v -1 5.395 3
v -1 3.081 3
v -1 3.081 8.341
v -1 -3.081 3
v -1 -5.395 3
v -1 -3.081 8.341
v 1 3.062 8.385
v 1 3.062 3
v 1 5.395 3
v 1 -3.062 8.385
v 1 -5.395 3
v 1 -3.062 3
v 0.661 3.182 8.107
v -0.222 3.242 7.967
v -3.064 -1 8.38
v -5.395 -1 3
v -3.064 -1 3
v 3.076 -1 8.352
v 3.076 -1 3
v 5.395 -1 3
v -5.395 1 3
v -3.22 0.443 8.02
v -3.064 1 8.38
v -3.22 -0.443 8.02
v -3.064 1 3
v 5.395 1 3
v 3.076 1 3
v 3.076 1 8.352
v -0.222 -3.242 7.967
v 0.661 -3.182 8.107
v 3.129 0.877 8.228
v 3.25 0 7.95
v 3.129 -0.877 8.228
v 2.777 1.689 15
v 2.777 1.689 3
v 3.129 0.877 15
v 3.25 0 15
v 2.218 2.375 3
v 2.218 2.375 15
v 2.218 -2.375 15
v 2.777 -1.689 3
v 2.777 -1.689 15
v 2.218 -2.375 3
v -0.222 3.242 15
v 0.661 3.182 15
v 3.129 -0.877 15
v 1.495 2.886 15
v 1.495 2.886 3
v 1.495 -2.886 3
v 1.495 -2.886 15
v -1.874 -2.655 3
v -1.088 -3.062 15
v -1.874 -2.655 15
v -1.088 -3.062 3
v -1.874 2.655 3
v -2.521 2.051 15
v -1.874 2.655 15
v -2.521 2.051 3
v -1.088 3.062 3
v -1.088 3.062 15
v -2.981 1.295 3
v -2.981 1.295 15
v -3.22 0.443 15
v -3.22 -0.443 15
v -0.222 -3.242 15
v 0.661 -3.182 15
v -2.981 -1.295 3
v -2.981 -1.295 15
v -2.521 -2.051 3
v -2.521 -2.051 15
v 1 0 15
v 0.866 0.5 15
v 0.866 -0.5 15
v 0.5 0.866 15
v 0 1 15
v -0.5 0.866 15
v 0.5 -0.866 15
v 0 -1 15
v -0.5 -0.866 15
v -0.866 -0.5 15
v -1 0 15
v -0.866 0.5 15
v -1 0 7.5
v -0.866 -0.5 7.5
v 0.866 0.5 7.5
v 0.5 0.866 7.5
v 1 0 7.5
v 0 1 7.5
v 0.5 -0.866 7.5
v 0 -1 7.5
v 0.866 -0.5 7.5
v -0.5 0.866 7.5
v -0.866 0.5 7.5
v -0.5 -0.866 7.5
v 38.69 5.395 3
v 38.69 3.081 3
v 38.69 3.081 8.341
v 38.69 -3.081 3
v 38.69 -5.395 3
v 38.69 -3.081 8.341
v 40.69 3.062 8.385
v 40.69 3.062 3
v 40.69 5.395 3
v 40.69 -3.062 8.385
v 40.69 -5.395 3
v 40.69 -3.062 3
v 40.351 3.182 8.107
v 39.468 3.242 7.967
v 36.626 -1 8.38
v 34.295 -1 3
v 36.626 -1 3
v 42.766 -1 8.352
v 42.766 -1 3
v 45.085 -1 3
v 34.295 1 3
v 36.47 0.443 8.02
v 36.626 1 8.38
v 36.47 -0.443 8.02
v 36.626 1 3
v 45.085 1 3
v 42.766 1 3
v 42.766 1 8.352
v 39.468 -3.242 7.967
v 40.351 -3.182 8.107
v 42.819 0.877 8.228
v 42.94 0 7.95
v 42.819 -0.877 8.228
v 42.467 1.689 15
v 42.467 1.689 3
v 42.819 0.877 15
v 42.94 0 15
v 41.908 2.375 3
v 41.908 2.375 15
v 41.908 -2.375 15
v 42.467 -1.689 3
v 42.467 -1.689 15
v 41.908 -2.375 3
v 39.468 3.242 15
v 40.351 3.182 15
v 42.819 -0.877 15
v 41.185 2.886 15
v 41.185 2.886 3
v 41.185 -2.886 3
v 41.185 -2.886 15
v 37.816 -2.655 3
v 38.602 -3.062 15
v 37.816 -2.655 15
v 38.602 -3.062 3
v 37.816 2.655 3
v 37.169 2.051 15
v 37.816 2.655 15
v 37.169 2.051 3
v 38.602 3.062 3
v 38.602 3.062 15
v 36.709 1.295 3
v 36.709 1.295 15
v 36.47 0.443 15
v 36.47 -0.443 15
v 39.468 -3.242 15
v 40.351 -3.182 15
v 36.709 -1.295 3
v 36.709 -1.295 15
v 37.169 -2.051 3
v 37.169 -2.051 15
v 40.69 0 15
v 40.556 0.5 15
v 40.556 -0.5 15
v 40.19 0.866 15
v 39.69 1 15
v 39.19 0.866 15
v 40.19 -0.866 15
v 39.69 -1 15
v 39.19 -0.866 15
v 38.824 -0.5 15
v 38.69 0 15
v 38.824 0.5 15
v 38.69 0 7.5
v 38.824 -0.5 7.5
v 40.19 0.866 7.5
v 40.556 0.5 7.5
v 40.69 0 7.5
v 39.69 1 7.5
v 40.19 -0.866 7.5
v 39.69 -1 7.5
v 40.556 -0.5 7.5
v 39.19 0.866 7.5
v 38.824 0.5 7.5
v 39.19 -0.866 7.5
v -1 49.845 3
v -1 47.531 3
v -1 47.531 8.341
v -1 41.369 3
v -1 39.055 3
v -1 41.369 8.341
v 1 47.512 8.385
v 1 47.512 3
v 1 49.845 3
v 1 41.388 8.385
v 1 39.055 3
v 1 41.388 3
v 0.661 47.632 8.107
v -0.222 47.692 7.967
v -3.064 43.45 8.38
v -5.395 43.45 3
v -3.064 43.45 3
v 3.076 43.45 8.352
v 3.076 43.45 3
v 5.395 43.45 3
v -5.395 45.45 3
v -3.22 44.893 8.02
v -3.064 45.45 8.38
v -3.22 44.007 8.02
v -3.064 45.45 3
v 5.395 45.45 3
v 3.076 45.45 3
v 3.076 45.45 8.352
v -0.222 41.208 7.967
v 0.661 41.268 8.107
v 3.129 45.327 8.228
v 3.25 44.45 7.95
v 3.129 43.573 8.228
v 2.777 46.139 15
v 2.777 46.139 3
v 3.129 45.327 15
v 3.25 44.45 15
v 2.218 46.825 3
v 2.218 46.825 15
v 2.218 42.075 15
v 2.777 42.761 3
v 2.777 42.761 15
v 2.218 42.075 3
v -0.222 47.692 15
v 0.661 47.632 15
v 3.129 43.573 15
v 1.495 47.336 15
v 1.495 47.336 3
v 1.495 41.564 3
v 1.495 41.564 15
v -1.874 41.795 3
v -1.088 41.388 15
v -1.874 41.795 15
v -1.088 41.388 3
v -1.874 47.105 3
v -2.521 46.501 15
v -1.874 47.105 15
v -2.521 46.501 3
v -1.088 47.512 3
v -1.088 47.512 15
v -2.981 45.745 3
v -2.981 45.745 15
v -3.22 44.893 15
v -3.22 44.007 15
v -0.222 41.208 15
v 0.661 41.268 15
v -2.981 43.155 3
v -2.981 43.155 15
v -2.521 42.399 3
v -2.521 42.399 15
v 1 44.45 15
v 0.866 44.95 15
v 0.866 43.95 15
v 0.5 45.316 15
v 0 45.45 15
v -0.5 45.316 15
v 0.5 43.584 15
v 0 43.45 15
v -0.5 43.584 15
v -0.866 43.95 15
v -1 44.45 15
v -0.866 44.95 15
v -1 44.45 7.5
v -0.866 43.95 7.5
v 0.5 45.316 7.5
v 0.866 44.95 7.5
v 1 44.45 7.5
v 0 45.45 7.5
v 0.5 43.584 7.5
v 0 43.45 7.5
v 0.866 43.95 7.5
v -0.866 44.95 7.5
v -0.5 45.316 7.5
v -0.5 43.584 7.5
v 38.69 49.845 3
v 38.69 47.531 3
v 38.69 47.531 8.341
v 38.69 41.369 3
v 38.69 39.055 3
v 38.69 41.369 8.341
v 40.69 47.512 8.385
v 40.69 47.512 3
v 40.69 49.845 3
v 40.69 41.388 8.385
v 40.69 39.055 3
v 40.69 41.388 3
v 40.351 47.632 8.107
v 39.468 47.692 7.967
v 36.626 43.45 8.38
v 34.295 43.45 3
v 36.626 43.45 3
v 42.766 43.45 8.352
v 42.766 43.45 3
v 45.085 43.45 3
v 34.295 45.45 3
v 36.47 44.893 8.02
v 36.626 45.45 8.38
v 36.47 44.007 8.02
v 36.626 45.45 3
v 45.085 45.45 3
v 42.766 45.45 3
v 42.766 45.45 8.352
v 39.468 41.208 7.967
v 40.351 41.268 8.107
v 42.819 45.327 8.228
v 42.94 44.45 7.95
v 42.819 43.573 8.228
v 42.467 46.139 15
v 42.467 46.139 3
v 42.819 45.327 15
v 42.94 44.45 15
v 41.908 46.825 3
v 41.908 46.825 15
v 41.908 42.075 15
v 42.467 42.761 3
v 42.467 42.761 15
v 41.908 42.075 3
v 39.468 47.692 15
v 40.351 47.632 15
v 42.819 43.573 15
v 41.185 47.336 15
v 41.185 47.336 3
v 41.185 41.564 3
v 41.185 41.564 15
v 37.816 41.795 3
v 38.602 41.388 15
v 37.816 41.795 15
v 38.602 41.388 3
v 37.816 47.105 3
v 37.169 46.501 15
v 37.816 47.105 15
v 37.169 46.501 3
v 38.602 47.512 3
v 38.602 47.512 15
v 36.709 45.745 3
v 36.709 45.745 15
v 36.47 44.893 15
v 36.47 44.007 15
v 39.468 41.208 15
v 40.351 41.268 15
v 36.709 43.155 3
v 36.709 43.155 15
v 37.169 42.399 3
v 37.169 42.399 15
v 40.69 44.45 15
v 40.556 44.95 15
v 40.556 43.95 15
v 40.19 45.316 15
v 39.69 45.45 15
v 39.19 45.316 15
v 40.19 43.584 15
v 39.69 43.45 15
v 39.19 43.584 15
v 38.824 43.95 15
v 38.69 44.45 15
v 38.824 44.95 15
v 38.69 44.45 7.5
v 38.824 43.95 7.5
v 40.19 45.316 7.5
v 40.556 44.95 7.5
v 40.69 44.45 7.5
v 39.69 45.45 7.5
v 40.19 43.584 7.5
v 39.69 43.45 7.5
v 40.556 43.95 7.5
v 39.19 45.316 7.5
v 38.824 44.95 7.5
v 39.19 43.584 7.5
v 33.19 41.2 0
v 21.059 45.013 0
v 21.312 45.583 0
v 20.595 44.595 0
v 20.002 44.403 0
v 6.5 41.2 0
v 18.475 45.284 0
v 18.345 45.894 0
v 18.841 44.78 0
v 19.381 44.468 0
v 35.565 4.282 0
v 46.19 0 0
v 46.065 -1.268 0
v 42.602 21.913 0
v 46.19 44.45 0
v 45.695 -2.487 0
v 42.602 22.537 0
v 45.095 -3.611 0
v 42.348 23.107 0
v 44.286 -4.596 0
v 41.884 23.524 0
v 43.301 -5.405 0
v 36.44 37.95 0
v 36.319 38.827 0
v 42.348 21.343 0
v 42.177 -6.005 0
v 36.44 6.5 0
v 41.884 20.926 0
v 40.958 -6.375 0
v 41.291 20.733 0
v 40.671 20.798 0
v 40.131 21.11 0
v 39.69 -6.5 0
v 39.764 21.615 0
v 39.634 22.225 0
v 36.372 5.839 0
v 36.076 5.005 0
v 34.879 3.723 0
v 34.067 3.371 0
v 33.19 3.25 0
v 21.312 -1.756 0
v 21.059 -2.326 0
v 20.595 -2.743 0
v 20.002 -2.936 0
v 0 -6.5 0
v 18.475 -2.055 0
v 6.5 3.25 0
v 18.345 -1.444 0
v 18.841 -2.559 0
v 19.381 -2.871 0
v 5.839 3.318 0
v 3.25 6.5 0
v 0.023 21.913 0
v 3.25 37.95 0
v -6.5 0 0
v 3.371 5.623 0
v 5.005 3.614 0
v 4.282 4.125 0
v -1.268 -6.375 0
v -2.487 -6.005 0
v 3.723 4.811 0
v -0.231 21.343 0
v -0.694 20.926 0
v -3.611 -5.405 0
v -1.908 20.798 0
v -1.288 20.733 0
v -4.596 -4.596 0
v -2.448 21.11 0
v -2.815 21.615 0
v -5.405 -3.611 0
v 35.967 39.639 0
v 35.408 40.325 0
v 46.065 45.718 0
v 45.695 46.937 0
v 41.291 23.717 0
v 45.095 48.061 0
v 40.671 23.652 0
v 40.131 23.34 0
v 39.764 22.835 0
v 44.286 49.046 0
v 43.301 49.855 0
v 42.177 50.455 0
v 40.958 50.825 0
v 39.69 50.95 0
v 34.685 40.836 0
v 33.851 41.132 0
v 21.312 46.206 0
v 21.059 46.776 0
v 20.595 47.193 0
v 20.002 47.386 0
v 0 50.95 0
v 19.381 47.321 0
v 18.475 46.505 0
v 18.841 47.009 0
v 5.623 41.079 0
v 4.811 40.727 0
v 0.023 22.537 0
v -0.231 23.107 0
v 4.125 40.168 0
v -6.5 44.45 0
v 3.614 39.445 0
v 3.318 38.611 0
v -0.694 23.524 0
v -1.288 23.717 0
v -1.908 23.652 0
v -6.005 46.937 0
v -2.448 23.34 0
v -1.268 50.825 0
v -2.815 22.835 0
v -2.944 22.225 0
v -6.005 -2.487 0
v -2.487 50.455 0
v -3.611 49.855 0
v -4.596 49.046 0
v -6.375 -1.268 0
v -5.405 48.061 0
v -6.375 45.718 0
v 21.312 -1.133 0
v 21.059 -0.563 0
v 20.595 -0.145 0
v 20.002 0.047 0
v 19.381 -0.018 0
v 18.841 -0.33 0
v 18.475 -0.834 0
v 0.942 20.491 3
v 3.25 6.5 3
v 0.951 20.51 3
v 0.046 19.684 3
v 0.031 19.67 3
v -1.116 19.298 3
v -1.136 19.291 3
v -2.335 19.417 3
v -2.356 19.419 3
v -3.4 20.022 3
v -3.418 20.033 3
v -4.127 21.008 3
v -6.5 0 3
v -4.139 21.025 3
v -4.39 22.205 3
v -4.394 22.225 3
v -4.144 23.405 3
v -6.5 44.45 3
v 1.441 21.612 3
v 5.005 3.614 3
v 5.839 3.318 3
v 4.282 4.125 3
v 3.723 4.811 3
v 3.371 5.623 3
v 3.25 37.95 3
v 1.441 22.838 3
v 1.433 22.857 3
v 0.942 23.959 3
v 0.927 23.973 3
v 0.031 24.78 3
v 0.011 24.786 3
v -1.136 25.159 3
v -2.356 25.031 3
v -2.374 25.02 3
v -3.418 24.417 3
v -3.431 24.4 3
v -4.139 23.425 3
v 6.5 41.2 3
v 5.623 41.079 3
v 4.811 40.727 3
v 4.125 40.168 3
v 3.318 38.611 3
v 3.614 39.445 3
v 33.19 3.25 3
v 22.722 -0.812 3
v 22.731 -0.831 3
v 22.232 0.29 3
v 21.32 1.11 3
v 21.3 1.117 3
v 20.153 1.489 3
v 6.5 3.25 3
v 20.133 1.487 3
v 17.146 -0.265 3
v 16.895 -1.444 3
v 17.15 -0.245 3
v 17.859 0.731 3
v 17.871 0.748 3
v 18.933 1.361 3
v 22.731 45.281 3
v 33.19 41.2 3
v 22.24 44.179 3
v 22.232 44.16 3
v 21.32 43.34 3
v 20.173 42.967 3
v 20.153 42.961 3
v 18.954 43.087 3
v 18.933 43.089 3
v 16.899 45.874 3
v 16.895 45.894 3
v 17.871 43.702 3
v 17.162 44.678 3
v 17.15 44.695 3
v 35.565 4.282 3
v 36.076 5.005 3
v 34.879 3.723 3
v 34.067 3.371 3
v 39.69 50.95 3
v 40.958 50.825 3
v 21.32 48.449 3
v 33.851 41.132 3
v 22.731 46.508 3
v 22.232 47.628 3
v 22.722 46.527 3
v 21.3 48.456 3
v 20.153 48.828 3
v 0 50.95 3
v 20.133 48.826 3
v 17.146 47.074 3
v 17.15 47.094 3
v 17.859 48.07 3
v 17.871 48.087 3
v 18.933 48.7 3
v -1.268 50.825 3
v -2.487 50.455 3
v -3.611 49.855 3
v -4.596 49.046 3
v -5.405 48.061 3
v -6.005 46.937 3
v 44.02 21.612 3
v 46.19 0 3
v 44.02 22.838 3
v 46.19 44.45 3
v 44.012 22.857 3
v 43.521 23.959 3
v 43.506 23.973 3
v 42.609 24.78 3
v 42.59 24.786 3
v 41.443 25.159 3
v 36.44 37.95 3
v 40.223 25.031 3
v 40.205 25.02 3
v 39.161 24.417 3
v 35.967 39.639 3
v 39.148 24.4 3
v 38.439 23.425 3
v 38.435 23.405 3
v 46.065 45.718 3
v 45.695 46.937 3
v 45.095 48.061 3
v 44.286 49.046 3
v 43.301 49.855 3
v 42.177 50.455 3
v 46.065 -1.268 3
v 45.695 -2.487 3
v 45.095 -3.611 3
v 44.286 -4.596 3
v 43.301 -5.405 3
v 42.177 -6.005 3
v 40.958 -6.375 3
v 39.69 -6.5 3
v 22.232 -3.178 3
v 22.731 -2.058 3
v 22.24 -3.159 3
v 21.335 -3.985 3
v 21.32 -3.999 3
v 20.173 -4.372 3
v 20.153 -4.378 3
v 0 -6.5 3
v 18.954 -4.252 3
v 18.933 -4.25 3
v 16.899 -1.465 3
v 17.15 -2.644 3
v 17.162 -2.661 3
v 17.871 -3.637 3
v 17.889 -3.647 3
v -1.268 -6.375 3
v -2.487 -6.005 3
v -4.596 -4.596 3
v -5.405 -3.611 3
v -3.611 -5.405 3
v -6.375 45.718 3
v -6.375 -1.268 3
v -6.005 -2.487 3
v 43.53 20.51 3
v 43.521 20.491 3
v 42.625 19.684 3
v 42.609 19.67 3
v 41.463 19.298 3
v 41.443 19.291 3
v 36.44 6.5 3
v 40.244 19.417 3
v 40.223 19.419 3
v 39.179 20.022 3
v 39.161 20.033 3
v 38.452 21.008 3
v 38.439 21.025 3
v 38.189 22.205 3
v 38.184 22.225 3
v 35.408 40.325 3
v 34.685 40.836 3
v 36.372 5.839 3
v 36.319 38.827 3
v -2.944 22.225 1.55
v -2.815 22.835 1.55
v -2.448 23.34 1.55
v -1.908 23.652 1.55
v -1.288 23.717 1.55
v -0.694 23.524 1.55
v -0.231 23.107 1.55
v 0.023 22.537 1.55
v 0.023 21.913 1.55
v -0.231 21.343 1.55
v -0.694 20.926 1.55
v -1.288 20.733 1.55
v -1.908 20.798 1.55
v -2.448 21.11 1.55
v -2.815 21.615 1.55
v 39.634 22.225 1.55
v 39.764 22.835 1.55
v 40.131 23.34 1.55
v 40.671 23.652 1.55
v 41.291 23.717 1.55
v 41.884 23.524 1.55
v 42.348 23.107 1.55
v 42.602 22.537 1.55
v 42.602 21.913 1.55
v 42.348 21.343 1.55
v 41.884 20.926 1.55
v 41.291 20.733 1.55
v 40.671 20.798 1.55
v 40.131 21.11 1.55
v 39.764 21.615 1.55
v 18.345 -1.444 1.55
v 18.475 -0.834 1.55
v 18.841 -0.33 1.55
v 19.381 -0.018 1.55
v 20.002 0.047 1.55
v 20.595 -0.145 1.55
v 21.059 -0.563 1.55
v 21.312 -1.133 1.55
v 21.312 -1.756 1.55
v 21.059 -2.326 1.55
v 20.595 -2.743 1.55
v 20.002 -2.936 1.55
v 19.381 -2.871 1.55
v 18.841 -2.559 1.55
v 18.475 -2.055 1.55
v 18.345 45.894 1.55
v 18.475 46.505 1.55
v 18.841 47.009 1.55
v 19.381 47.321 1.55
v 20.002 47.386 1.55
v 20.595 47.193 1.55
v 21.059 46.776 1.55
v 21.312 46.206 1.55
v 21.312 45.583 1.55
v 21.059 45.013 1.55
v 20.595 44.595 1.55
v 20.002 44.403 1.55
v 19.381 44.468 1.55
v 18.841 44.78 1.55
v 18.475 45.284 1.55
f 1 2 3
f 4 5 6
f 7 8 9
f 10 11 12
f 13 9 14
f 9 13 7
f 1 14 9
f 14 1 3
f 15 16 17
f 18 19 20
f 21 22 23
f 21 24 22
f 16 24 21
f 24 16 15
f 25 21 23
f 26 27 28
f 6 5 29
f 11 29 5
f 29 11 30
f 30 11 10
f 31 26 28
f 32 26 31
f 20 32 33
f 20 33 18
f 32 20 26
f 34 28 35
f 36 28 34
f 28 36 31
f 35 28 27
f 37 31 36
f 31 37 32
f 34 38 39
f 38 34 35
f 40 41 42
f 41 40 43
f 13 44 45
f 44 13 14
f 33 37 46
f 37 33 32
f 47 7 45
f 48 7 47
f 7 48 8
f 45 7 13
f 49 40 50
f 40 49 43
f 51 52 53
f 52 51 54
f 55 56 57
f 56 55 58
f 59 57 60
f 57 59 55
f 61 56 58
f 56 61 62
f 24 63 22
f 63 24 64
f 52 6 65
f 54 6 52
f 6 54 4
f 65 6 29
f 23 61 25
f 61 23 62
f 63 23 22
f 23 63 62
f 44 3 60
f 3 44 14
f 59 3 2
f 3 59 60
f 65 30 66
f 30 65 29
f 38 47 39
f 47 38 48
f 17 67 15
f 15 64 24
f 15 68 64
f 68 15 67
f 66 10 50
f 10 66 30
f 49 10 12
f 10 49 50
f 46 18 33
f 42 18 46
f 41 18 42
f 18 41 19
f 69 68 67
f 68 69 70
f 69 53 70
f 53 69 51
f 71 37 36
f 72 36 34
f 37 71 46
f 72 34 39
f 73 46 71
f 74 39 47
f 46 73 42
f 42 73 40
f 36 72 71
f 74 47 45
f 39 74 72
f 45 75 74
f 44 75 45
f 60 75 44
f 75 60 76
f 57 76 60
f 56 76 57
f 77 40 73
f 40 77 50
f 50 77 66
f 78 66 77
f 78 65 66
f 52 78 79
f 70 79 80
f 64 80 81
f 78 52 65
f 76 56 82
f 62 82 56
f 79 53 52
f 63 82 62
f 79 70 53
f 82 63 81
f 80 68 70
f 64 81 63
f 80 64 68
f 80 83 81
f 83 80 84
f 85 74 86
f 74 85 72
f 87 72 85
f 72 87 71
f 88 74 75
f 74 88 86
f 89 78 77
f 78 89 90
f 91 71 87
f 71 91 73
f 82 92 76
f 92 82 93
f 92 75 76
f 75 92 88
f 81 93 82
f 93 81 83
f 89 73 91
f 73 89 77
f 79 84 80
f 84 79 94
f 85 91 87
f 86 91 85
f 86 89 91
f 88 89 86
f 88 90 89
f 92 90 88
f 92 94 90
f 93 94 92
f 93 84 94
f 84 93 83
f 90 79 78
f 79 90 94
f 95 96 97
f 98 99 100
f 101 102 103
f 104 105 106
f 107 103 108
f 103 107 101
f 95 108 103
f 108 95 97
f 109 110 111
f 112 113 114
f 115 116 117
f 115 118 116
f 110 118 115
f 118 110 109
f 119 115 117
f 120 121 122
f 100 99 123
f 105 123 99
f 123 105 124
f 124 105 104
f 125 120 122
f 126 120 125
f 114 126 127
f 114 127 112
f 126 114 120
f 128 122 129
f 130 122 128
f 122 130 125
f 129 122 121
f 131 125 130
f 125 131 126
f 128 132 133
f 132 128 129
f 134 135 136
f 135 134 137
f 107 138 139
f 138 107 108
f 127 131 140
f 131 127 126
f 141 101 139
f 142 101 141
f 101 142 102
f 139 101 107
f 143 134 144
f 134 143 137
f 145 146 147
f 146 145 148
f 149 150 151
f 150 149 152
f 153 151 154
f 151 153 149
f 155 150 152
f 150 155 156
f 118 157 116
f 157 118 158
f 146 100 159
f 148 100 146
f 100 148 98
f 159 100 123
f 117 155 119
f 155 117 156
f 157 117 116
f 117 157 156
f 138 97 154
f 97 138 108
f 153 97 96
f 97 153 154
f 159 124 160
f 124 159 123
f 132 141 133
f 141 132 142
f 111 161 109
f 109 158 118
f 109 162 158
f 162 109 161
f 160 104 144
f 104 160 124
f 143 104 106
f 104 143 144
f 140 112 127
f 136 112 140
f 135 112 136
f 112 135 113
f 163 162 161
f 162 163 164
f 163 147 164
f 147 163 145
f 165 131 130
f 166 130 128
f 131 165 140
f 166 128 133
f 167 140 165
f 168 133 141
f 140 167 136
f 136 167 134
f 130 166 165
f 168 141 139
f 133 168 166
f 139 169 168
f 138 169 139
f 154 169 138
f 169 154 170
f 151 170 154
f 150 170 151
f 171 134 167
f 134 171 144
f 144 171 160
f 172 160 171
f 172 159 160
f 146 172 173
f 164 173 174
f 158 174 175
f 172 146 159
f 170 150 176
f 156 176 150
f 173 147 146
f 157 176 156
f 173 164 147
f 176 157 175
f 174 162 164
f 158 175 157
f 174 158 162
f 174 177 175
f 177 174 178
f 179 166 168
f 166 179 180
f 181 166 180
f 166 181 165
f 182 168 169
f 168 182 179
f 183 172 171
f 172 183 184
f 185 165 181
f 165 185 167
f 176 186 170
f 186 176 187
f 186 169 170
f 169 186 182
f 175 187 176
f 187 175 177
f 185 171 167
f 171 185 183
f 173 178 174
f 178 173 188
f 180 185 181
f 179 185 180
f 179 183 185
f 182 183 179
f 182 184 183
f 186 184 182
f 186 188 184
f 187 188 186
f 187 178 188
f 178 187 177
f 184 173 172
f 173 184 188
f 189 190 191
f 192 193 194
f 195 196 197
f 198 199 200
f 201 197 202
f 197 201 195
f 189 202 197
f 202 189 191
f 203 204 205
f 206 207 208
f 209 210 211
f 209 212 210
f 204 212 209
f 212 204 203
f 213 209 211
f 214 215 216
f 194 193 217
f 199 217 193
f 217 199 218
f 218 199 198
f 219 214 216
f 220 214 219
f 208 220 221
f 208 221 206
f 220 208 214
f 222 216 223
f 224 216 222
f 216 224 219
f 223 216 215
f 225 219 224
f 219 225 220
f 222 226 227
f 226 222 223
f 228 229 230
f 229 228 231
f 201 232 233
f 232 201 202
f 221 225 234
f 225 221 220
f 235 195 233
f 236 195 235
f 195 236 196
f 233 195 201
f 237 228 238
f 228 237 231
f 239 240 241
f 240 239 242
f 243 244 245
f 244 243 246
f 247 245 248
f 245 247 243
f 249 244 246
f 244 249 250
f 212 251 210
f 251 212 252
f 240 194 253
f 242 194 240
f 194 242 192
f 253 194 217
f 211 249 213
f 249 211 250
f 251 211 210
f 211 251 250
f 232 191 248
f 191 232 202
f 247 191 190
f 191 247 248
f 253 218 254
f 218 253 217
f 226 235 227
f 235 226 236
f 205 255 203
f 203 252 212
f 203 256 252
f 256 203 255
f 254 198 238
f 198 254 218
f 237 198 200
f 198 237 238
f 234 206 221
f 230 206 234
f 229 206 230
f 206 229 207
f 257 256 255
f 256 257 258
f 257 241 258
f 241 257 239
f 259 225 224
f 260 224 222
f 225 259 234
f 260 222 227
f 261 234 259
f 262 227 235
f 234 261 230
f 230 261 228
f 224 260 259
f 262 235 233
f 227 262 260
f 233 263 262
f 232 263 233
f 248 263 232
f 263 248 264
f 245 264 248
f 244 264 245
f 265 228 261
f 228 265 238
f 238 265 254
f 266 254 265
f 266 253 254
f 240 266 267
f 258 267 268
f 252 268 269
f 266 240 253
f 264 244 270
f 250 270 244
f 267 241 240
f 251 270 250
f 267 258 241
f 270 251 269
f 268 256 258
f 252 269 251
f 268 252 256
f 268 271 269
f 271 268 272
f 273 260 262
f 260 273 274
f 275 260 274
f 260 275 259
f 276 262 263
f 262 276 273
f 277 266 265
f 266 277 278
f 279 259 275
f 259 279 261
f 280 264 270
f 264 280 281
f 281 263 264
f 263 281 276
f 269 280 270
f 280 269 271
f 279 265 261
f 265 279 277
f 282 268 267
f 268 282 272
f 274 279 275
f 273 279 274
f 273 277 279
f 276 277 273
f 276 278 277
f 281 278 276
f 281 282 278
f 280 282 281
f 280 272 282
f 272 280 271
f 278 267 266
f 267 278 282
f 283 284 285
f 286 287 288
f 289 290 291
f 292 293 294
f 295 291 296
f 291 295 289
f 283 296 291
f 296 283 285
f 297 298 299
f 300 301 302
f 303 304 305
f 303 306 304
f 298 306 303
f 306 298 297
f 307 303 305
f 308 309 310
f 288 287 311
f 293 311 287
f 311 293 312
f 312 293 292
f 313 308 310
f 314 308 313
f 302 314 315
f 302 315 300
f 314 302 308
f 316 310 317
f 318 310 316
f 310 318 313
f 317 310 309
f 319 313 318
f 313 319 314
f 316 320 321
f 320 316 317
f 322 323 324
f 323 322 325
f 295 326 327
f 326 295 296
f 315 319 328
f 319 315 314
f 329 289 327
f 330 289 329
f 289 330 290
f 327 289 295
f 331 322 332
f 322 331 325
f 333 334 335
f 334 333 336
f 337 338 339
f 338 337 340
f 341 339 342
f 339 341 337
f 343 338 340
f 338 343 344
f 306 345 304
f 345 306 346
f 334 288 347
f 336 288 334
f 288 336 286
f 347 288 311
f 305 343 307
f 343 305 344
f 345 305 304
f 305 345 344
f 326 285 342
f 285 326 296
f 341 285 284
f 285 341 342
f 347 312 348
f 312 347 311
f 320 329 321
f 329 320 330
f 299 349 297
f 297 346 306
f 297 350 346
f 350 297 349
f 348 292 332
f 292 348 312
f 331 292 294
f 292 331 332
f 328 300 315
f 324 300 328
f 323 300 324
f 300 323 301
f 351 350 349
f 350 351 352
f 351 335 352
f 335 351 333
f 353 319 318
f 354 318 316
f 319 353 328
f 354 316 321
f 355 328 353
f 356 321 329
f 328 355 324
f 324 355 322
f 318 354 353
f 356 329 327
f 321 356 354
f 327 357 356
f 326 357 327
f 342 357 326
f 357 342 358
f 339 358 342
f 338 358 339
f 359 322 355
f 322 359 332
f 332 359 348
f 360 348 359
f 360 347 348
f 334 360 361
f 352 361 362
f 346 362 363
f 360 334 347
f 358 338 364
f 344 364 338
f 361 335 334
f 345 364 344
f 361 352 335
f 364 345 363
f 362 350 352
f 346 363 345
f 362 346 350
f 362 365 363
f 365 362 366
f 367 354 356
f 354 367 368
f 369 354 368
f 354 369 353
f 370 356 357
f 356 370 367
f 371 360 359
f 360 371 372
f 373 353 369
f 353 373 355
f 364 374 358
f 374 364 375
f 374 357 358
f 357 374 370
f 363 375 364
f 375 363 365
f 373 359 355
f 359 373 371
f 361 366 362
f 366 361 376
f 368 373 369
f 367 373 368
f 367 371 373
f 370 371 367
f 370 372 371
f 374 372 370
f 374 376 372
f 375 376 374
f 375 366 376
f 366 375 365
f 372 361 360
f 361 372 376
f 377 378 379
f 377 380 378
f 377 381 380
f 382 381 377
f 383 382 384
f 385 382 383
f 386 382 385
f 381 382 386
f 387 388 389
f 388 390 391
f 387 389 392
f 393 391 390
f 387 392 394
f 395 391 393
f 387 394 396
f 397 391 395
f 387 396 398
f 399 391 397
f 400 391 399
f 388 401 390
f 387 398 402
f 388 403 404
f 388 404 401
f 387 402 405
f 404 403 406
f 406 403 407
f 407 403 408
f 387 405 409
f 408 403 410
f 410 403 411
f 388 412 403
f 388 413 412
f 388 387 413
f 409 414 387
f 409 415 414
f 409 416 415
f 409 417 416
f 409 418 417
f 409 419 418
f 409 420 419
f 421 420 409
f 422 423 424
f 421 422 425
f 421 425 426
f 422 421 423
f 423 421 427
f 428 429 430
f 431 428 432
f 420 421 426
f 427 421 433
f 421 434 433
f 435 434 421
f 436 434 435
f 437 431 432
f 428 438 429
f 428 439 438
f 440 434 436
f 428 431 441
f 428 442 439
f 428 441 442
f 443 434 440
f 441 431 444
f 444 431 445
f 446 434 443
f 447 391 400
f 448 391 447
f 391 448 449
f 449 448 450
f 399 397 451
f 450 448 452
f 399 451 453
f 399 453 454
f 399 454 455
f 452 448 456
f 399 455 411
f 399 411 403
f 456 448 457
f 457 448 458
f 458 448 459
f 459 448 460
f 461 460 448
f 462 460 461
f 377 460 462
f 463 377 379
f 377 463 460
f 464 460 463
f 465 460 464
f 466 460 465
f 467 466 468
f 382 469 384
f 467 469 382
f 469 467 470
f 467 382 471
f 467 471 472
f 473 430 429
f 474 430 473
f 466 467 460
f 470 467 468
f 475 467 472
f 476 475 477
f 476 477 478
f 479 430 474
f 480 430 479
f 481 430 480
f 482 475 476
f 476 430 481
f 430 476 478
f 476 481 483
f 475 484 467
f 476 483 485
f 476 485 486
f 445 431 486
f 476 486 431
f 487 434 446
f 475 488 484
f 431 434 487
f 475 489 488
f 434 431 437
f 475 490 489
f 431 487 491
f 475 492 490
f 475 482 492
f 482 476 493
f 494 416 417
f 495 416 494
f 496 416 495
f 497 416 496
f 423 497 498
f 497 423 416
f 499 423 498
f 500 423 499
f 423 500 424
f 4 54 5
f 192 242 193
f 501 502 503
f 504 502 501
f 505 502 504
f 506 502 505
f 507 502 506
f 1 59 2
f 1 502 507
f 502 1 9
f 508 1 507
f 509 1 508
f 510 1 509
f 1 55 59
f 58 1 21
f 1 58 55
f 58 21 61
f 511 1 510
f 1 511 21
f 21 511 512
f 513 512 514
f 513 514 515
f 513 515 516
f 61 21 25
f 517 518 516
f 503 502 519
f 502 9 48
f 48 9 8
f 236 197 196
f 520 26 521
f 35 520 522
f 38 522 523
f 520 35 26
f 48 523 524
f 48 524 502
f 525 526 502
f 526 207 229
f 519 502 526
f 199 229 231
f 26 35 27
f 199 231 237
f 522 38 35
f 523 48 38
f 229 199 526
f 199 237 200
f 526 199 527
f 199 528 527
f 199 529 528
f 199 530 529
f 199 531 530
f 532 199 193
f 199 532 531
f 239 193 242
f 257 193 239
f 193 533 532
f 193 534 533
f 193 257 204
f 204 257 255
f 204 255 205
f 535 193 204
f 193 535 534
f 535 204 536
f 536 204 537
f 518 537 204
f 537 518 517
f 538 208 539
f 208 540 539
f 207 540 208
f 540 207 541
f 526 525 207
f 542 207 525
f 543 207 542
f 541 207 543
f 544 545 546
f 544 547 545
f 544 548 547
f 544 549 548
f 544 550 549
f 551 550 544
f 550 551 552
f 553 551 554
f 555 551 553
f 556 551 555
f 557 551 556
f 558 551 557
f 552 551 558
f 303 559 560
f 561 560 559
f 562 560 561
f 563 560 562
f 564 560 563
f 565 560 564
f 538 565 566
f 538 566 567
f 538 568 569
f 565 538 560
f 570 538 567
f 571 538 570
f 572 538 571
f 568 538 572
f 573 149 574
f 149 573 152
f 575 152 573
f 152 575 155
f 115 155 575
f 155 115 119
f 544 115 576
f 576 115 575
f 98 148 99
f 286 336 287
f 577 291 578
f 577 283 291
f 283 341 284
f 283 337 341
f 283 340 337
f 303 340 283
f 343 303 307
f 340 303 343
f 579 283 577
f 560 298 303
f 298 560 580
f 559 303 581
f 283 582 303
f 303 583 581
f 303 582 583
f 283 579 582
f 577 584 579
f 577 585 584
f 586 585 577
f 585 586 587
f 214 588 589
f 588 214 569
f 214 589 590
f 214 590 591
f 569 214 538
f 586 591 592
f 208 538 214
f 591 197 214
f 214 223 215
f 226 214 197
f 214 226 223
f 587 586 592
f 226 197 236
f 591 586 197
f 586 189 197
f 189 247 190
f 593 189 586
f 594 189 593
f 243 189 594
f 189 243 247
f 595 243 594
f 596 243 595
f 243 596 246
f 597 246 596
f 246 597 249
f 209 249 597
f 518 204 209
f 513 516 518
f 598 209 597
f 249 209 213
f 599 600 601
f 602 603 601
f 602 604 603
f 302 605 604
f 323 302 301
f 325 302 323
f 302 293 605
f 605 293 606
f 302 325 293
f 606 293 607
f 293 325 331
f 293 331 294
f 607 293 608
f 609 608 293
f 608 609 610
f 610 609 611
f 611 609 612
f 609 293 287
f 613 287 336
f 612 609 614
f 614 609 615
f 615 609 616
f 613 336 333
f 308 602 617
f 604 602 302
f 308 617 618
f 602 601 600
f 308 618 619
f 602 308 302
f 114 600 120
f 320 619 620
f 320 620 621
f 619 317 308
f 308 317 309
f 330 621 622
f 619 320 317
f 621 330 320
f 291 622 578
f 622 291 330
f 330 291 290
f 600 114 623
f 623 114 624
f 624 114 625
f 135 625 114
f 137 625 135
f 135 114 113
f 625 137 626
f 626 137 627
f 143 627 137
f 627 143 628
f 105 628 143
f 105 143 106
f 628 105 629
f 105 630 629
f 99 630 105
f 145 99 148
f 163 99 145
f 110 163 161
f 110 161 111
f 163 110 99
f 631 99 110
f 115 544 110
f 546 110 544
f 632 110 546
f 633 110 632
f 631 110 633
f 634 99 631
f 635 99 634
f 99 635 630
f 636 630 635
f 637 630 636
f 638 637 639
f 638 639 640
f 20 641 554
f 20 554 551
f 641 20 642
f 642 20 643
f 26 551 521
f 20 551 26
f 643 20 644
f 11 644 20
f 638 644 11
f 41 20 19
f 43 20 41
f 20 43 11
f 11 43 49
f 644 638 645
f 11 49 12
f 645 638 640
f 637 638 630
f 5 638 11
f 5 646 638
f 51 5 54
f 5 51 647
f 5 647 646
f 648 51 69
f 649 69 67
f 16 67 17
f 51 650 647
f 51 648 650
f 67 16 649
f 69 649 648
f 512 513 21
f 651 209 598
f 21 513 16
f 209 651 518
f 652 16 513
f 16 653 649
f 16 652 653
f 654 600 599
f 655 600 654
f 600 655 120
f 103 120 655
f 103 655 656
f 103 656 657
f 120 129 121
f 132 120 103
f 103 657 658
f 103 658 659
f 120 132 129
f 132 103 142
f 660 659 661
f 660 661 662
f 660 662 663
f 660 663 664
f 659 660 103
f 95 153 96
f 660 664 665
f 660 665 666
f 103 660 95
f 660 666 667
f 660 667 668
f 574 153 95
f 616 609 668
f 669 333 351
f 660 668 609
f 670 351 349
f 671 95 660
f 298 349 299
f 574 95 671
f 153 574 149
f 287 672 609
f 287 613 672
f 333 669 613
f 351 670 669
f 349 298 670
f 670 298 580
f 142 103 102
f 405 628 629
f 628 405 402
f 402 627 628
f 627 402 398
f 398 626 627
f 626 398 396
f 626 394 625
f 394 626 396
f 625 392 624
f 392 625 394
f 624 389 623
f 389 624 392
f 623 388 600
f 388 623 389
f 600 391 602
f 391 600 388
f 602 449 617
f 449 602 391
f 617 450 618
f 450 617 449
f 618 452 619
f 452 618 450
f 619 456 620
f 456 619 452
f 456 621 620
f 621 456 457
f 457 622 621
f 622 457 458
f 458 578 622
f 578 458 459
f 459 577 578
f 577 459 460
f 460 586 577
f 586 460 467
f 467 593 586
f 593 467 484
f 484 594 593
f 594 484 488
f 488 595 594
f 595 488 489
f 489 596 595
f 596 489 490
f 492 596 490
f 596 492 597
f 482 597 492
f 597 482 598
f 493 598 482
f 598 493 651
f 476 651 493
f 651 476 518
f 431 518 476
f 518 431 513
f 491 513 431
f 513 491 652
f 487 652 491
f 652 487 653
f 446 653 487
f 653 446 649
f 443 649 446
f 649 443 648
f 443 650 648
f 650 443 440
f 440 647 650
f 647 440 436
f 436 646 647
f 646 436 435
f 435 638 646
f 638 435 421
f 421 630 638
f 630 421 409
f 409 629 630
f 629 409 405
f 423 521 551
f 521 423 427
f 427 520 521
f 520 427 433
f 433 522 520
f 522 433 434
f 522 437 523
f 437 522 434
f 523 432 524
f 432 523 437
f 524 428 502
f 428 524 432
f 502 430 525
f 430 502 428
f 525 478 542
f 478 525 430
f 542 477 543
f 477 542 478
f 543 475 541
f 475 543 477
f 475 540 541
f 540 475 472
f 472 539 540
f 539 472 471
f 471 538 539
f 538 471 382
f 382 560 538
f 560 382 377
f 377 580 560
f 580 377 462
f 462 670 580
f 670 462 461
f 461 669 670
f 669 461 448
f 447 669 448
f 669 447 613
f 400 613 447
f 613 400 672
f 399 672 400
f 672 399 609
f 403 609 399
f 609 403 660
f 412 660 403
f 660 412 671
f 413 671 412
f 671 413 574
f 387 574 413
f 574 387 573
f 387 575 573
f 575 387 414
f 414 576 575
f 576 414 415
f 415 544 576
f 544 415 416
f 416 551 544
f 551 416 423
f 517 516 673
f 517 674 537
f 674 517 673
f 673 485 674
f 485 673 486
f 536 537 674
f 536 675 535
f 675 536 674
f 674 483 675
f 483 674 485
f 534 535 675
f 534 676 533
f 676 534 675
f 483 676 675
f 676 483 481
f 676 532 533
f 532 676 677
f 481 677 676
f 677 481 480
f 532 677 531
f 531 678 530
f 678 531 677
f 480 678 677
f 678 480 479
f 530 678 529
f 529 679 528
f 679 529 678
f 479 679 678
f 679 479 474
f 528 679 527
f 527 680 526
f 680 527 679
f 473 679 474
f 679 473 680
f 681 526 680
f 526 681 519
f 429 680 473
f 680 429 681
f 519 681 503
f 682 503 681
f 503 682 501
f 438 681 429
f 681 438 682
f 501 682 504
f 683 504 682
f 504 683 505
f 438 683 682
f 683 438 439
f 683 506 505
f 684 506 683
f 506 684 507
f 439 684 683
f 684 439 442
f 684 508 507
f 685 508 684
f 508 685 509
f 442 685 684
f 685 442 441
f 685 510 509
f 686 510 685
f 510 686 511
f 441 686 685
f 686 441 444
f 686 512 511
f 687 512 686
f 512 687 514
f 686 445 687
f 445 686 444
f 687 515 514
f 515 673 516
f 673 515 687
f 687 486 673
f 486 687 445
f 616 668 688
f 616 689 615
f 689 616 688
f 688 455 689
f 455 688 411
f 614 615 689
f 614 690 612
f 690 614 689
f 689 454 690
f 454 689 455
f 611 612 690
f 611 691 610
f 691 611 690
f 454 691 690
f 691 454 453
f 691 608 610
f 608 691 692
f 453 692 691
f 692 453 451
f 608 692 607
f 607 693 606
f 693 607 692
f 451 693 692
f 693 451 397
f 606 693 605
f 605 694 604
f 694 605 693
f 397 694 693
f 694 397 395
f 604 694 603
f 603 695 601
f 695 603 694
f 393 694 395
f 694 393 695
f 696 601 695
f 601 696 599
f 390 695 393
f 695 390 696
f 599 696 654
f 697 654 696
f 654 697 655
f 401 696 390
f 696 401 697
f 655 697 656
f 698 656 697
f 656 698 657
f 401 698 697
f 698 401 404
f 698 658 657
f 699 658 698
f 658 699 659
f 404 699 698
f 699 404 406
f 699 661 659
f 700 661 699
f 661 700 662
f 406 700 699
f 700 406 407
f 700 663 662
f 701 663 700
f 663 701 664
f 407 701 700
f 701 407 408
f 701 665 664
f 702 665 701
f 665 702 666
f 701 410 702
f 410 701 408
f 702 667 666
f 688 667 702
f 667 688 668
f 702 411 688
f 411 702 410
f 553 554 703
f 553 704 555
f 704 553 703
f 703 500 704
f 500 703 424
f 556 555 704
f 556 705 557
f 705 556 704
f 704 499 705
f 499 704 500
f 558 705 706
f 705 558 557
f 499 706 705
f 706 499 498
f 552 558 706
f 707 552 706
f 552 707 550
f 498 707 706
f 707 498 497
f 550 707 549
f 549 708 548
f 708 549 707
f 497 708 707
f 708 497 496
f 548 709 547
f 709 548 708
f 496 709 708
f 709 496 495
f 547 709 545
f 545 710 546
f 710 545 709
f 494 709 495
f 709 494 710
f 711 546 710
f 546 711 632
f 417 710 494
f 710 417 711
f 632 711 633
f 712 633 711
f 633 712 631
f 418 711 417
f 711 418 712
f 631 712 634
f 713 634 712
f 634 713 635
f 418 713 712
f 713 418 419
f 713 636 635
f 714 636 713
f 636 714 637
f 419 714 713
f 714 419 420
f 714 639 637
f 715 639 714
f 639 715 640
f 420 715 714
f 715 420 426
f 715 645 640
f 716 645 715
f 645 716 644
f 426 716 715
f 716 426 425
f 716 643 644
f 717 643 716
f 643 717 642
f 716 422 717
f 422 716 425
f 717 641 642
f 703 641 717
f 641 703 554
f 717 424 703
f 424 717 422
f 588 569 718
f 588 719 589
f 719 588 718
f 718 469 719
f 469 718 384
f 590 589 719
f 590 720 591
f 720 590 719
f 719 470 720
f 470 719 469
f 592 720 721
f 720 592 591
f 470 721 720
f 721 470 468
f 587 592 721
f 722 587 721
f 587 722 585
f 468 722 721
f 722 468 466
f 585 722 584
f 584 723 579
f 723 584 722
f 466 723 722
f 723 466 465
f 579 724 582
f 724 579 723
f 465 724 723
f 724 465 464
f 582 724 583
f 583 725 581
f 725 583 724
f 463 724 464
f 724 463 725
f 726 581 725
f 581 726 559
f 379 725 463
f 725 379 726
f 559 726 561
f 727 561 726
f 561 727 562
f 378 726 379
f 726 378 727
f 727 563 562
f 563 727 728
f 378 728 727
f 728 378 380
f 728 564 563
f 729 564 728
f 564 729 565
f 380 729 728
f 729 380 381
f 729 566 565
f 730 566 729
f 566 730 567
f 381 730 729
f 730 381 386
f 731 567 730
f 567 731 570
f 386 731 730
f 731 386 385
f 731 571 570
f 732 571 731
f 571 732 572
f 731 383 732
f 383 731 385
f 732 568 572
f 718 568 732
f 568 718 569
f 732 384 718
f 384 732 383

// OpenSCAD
//------------------------------------------------------------------
/*

4 Pillar PCB Mount

*/
//------------------------------------------------------------------
/* [Global] */

/*[General]*/
mount_width = 39.69;
mount_length = 44.45;
mount_height = 15;
mount_base_z = 3;
mount_hole_diameter = 3;
pillar_diameter = 6.5;
pillar_hole_diameter = 2;

/* [Hidden] */
//------------------------------------------------------------------

// small tweak to avoid differencing artifacts
epsilon = 0.05;

// control the number of facets on cylinders
facet_epsilon = 0.03;
function facets(r) = 180 / acos(1 - (facet_epsilon / r));

// rounded polygons
module rounded(r=1) {
  offset(r=r, $fn=facets(r)) offset(r=-r, $fn=facets(r)) children(0);
}

// filleted polygons
module filleted(r=1) {
  offset(r=-r, $fn=facets(r)) render() offset(r=r, $fn=facets(r)) children(0);
}

//------------------------------------------------------------------
// Mounting pillar with support webs

// single web
module pillar_web(
  web_height,
  web_radius,
  web_width
) {
  h = web_height;
  r = web_radius;
  w = web_width;
  points = [
    [0,0],
    [r,0],
    [0,h],
  ];
  rotate([90,0,0]) translate([0,0,-w/2]) linear_extrude(height=w) polygon(points=points);
}

// multiple webs
module pillar_webs(
  number_webs,
  web_height,
  web_radius,
  web_width
) {
  theta = 360 / number_webs;
  for (i = [1:number_webs]) {
    rotate([0,0,i * theta]) pillar_web(web_height, web_radius, web_width);
  }
}

// pillar
module pillar(
  pillar_height,
  pillar_radius
) {
  h = pillar_height;
  r = pillar_radius;
  cylinder(h=h, r=r, $fn=facets(r));
}

module pillar_hole(
  pillar_height,
  hole_depth,
  hole_radius
) {
  h = hole_depth + epsilon;
  r = hole_radius;
  z_ofs = pillar_height - hole_depth;
  translate([0,0,z_ofs]) cylinder(h=h, r=r, $fn=facets(r));
}

// pillar with webs
module webbed_pillar(
  pillar_height,
  pillar_radius,
  hole_depth,
  hole_radius,
  number_webs,
  web_height,
  web_radius,
  web_width,
) {
  intersection () {
    difference() {
      union() {
        pillar(pillar_height, pillar_radius);
        pillar_webs(number_webs, web_height, web_radius, web_width);
      }
      pillar_hole(pillar_height, hole_depth, hole_radius);
    }
    // Cut off any part of the webs that protrude from the
    // top of the pillar.
    cylinder(r = web_radius * 2, h = pillar_height);
  }
}

//------------------------------------------------------------------

// countersunk hole
module hole_countersunk(
  length,
  radius,
) {
  l = length;
  r = radius;
  if (r > l) {
    points = [
      [0, 0],
      [(2 * r) - l, 0],
      [2 * r, l],
      [0, l]
    ];
    rotate_extrude($fn=facets(r)) polygon(points=points);
  } else {
    points = [
      [0, 0],
      [r, 0],
      [r, l - r],
      [2 * r, l],
      [0, l]
    ];
    rotate_extrude($fn=facets(r)) polygon(points=points);
  }
}

//------------------------------------------------------------------

module mount_pillar() {
  z = mount_height - mount_base_z + epsilon;
  z_ofs = mount_base_z - epsilon;
  translate([0,0,z_ofs]) webbed_pillar(
    pillar_height = z,
    pillar_radius = pillar_diameter / 2,
    hole_depth = mount_height / 2,
    hole_radius = pillar_hole_diameter / 2,
    number_webs = 4,
    web_height = mount_height / 1.2,
    web_radius = pillar_diameter / 1.2,
    web_width = 2
  );
}

module pcb_mount_hole() {
  h = mount_base_z + (2 * epsilon);
  r = mount_hole_diameter / 2;
  translate([0,0,-epsilon])hole_countersunk(h, r);
}

module mount_base_2d() {
  w = mount_width;
  l = mount_length;
  points = [
    [0,0],
    [w,0],
    [w,l],
    [0,l],
  ];
  polygon(points=points);
}

//------------------------------------------------------------------

module pcb_mount_base() {
  r0 = pillar_diameter;
  r1 = r0 / 2.0;
  h = mount_base_z;
  linear_extrude(height = h) difference() {
    offset(r=r0, $fn=facets(r0)) mount_base_2d();
    rounded(r=r1) offset(r=-r1, $fn=facets(r1)) mount_base_2d();
  }
}

module pcb_mount_pillars() {
  w = mount_width;
  l = mount_length;
  translate([0,0]) mount_pillar();
  translate([w,0]) mount_pillar();
  translate([0,l]) mount_pillar();
  translate([w,l]) mount_pillar();
}

module pcb_mount_holes() {
  w = mount_width;
  l = mount_length;
  ofs = pillar_diameter / 4.5;
  y_mid = l/2;
  x_mid = w/2;
  translate([-ofs,y_mid]) pcb_mount_hole();
  translate([w+ofs, y_mid]) pcb_mount_hole();
  translate([x_mid,-ofs]) pcb_mount_hole();
  translate([x_mid,l+ofs]) pcb_mount_hole();
}

//------------------------------------------------------------------

module pcb_mount() {
  difference() {
    union() {
      pcb_mount_base();
      pcb_mount_pillars();
    }
    pcb_mount_holes();
  }
}

pcb_mount();

//------------------------------------------------------------------
